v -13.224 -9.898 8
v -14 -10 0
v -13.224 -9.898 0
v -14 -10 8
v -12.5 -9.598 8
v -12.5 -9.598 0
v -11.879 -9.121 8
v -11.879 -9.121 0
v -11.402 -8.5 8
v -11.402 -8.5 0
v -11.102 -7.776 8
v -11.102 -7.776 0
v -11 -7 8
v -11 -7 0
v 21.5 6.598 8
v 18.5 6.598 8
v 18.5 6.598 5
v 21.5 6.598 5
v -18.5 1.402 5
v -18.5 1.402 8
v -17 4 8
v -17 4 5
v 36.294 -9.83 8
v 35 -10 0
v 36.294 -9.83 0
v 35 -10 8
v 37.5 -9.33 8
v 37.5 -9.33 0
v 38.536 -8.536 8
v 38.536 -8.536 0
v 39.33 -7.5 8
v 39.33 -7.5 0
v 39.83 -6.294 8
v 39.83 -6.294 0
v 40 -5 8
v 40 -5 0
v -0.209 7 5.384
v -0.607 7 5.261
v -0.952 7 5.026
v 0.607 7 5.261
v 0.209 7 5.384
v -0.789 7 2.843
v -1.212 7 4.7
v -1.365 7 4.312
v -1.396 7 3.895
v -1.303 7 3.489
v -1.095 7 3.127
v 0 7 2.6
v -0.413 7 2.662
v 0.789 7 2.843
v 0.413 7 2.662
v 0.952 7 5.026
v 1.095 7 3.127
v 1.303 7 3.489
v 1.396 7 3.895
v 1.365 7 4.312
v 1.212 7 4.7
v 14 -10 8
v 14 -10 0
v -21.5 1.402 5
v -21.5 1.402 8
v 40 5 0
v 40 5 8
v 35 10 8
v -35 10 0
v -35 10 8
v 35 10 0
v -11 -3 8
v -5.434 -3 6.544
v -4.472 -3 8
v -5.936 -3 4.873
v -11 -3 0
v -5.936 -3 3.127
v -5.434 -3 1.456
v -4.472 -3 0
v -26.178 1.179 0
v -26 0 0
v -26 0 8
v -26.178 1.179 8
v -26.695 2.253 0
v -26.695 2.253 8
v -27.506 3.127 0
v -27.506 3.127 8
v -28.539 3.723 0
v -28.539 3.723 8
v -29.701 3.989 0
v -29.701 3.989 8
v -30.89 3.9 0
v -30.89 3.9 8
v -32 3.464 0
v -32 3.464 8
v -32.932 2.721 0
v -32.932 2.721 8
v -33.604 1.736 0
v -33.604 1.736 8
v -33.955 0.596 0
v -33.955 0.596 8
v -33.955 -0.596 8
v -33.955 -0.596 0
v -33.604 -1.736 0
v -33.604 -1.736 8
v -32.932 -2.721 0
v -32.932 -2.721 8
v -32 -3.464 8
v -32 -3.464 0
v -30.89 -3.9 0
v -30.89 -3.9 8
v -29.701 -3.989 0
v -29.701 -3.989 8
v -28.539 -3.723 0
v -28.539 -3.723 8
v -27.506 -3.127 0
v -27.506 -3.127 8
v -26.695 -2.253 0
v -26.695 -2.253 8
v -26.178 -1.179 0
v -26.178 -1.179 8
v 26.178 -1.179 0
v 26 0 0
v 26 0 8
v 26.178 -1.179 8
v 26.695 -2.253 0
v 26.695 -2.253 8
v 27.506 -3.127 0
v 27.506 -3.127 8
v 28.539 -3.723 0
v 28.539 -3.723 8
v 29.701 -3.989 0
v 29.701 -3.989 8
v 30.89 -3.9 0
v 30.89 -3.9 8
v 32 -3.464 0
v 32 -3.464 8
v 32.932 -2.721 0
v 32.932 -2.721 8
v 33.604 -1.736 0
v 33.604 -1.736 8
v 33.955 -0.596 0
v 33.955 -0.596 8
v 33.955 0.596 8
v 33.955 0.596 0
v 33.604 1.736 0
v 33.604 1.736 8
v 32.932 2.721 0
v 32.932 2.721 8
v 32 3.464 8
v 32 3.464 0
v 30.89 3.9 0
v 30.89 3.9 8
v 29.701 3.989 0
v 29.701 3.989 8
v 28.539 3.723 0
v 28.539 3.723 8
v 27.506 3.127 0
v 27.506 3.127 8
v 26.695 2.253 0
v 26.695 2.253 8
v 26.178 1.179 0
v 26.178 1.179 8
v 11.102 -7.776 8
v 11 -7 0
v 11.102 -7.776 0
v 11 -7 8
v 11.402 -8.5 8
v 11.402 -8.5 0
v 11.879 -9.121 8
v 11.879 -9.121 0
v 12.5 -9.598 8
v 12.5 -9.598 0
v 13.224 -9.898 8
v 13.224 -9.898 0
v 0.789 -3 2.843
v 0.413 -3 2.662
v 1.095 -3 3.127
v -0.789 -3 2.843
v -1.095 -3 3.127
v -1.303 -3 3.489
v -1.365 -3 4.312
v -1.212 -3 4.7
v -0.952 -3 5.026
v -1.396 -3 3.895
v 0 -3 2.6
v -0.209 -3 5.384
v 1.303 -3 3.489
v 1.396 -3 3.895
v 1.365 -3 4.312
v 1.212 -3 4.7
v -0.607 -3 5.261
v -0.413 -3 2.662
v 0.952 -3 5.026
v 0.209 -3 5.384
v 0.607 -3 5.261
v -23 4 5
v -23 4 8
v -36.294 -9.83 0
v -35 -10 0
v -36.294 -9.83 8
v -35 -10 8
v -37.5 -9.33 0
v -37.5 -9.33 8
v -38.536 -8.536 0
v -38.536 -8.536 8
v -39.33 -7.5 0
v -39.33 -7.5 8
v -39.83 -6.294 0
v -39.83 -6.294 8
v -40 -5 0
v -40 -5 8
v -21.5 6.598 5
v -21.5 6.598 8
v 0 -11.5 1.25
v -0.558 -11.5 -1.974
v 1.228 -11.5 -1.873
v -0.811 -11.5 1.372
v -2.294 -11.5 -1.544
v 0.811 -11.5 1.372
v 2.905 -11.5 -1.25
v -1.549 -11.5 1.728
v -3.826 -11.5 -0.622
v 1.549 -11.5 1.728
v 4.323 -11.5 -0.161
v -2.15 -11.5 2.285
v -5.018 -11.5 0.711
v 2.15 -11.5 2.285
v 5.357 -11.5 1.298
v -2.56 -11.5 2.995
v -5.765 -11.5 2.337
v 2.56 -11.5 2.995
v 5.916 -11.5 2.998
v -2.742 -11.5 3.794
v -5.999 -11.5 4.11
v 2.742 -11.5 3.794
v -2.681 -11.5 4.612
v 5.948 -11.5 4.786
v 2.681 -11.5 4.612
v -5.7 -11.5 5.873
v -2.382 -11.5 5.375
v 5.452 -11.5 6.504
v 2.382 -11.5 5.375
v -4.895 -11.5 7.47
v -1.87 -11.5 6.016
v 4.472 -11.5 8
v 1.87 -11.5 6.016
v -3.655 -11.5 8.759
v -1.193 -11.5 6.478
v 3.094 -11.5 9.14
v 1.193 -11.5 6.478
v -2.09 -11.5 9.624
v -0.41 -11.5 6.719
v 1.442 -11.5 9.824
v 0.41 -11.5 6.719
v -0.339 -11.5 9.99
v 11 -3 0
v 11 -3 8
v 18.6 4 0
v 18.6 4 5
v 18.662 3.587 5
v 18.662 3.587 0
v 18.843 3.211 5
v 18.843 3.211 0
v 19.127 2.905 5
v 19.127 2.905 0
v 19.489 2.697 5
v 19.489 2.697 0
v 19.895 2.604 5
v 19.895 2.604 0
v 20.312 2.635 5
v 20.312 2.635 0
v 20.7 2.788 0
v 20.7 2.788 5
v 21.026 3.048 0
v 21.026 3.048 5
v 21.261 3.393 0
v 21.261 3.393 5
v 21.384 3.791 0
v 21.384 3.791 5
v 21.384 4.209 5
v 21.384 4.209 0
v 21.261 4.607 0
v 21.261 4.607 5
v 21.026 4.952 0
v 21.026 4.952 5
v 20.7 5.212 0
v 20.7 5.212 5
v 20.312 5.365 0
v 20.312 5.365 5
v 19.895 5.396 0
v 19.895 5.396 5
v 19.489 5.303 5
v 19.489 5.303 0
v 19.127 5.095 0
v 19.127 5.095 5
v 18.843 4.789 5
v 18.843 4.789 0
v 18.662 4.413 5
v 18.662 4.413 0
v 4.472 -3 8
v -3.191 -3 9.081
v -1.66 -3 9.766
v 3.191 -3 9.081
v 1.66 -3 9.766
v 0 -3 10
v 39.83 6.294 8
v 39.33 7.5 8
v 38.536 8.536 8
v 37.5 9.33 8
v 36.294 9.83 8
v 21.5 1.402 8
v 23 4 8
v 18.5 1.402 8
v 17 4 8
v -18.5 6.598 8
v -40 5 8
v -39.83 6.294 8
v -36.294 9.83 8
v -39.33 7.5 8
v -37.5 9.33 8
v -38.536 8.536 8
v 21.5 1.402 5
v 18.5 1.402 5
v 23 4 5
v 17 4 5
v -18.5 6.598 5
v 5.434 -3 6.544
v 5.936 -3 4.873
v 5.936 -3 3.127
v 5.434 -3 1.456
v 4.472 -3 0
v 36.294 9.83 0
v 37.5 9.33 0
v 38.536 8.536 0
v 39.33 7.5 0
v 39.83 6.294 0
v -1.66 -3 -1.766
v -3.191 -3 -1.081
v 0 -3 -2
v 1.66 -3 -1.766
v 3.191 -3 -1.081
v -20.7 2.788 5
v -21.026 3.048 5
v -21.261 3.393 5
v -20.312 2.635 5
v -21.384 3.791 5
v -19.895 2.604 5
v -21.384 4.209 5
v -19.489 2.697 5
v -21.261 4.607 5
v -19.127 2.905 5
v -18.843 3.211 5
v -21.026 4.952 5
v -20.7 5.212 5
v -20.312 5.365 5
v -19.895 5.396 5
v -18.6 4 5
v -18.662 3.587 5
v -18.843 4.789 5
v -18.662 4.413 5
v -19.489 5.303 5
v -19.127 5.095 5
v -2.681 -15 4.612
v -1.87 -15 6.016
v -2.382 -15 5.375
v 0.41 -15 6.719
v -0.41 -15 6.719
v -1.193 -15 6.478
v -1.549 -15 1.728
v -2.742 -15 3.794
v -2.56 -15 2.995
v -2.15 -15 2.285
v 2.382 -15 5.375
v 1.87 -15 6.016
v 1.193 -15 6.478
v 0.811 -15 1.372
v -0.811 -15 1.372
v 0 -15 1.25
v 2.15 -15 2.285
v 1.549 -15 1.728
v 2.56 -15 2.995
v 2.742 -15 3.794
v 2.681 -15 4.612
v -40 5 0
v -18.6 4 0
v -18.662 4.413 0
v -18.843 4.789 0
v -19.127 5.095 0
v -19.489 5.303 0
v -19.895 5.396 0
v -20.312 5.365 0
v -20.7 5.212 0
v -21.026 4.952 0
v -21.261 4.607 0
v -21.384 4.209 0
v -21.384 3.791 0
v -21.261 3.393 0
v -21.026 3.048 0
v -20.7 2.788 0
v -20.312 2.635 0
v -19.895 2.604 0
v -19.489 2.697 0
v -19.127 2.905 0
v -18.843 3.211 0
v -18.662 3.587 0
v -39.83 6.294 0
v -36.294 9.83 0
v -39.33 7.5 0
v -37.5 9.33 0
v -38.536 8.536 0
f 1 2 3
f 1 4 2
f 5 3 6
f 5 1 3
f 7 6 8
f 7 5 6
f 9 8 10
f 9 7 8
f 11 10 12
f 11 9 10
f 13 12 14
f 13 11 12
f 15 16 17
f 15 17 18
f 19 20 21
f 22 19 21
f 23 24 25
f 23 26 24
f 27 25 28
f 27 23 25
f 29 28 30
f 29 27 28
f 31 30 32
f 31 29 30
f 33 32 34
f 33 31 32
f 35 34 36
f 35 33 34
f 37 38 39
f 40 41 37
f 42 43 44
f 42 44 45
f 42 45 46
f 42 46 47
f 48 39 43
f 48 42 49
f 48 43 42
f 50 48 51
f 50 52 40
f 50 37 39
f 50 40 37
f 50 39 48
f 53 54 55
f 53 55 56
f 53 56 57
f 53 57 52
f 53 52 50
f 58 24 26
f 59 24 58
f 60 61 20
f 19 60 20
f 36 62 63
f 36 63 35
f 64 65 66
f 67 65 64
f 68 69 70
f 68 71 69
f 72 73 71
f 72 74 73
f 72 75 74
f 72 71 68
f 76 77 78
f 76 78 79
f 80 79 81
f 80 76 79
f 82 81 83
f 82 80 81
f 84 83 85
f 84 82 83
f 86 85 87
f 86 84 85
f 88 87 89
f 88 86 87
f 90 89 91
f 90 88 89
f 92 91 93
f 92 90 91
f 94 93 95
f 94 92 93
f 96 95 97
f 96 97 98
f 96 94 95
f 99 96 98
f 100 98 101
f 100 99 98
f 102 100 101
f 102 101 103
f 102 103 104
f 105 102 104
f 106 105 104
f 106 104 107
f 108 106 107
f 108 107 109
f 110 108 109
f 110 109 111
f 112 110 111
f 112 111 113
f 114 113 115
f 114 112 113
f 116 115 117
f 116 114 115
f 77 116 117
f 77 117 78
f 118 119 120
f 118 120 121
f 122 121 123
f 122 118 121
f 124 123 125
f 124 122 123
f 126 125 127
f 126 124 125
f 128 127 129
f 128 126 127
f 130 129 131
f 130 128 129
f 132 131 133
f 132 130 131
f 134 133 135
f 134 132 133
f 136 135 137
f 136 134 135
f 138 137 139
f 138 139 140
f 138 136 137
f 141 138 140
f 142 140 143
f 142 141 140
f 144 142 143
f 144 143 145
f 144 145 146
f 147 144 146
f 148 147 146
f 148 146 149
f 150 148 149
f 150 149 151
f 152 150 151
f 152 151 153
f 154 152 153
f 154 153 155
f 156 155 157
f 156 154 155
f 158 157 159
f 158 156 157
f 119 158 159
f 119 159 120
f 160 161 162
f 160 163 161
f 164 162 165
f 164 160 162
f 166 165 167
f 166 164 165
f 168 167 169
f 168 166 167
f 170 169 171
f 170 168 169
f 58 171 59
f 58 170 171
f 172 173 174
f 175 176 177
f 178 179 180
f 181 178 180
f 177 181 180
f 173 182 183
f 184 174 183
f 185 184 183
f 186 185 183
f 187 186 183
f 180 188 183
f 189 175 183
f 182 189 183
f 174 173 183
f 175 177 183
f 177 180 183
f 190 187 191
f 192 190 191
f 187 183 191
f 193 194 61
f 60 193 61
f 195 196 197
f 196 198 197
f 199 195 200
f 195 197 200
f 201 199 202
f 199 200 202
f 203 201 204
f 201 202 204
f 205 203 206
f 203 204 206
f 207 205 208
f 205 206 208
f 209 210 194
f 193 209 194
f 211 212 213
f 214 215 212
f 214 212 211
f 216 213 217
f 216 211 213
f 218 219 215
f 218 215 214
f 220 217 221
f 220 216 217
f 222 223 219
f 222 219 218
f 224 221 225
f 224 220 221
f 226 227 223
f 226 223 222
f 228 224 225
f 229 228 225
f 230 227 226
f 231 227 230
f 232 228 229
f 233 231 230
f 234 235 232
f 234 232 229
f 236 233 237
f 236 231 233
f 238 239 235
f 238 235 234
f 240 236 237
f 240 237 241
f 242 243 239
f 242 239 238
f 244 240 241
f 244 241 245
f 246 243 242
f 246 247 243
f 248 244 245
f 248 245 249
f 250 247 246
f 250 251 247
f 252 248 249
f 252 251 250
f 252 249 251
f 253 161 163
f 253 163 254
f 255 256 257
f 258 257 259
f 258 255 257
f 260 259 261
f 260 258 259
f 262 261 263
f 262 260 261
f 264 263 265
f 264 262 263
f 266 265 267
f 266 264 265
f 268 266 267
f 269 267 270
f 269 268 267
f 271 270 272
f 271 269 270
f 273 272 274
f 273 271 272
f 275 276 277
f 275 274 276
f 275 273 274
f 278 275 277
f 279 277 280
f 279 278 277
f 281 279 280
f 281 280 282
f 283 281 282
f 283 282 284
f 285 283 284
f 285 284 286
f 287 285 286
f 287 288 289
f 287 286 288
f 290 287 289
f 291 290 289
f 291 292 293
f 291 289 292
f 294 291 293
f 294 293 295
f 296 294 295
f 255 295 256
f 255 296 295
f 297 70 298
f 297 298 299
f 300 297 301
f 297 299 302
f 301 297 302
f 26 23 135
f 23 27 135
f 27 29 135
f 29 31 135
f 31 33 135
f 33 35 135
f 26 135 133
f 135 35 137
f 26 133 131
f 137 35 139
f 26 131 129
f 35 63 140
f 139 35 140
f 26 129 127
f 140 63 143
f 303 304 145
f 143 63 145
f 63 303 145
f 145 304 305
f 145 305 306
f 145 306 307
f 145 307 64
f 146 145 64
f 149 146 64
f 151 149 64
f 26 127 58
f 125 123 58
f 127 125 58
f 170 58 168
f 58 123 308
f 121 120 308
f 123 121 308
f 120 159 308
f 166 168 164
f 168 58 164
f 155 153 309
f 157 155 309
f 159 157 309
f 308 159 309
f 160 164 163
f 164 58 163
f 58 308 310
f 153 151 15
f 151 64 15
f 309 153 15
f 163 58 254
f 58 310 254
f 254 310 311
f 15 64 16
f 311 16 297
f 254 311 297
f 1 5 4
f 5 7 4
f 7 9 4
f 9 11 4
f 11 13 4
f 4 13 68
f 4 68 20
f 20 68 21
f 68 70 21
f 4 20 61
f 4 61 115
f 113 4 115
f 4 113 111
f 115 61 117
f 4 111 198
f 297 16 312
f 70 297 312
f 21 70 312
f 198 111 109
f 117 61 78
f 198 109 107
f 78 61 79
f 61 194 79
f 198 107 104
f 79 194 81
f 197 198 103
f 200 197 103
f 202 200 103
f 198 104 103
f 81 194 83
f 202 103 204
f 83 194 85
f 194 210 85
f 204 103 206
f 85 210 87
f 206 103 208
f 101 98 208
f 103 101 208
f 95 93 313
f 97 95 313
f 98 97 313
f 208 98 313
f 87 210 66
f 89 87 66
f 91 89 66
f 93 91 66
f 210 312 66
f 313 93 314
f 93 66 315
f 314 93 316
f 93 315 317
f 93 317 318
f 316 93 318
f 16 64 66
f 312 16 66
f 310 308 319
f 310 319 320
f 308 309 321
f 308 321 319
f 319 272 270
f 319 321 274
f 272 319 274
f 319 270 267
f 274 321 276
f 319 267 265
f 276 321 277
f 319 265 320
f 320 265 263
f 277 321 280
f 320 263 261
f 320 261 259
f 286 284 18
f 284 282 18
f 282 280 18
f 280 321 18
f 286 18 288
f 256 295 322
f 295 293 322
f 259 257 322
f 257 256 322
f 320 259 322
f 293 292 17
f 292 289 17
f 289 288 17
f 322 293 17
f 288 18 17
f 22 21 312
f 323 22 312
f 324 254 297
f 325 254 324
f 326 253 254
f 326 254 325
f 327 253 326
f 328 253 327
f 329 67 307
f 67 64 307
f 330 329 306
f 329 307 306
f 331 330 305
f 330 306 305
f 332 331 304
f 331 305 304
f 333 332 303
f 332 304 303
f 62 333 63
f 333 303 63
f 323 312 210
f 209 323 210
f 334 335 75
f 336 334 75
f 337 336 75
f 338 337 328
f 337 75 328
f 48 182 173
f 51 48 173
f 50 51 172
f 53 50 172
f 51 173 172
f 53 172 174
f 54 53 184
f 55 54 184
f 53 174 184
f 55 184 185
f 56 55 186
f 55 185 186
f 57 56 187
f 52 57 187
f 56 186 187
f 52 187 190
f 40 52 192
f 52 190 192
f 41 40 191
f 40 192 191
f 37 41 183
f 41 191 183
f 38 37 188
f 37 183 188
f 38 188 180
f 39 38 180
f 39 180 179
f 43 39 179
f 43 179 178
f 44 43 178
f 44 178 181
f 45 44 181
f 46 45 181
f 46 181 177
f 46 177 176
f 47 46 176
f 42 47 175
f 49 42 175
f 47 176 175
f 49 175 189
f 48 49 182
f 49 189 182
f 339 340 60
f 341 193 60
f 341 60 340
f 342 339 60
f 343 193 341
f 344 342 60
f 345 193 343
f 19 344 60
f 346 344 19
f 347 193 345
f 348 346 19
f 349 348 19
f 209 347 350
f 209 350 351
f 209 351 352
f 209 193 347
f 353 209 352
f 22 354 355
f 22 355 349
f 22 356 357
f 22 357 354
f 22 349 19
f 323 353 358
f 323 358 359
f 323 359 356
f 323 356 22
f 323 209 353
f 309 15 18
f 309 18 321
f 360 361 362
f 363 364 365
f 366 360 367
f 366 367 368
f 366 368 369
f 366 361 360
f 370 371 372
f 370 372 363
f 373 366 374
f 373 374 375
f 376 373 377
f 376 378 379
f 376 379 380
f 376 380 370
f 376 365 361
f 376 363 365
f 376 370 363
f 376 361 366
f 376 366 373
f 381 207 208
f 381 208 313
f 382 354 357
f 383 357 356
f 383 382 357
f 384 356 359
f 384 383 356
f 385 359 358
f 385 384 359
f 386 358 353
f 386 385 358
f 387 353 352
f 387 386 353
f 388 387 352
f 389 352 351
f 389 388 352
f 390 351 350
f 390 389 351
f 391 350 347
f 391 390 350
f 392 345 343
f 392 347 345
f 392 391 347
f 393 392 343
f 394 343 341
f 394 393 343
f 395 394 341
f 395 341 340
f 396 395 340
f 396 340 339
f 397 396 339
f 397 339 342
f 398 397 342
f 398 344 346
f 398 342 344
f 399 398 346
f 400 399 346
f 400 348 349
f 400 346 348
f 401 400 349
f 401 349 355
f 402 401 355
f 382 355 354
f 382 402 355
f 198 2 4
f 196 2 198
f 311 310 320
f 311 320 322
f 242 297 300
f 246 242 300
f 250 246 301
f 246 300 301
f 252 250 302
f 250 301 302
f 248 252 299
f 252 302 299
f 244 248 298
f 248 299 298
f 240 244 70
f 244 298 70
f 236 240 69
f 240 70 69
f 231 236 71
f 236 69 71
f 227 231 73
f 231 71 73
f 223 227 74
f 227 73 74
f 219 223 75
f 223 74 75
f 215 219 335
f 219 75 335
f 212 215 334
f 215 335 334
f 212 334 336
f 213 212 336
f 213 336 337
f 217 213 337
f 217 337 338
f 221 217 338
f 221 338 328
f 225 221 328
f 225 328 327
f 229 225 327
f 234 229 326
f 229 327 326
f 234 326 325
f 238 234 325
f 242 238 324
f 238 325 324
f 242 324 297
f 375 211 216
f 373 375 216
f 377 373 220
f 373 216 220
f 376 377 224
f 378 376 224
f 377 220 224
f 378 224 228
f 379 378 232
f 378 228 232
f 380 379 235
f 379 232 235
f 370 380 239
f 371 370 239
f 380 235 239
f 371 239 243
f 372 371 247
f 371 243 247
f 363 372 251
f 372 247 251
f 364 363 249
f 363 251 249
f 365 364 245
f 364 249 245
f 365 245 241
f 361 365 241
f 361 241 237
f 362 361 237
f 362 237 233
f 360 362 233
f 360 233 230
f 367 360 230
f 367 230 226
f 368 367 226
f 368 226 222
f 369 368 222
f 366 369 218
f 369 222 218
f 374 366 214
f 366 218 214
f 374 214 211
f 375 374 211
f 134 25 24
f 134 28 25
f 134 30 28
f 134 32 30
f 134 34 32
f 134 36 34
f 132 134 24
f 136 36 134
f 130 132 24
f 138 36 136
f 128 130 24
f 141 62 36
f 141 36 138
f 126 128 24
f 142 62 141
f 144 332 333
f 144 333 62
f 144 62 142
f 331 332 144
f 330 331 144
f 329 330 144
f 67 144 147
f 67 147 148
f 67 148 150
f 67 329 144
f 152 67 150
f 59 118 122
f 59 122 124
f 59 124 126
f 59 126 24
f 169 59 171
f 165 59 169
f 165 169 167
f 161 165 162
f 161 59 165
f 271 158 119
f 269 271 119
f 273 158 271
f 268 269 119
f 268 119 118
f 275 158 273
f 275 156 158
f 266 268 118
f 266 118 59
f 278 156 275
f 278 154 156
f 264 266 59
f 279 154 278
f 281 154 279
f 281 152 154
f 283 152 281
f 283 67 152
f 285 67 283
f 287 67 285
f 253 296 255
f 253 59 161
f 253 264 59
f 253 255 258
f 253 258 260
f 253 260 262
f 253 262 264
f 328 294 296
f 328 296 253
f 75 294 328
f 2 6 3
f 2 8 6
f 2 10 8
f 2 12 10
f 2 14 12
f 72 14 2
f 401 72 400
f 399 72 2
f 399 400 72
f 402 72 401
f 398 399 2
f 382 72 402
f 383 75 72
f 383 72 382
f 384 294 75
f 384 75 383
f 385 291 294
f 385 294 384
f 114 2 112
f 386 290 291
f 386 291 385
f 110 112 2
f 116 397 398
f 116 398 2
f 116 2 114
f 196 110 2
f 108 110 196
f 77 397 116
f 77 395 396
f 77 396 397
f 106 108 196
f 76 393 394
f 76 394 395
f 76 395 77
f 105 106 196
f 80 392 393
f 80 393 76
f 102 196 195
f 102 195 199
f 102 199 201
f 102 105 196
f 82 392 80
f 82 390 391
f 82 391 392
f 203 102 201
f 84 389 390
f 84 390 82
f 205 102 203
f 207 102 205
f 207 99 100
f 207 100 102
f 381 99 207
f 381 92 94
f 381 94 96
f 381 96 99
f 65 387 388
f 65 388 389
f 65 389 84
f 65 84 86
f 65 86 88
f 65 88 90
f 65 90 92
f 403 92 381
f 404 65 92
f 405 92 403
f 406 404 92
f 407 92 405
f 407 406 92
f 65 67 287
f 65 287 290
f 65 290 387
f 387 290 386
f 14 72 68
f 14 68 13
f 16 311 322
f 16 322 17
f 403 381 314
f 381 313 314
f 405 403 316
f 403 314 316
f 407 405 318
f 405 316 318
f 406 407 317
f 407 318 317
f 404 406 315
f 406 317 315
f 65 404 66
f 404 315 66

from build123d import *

# Parameters (mm, degrees)
SKETCH1_R                = 4
SKETCH1_R_2              = 1.4
BOSS_EXTRUDE1_DEPTH      = 8
OUTSIDE_CURVES_R         = 5
INSIDE_CURVES_R          = 3
BOLT_HOLES_DEPTH         = 3
SKETCH3_R                = 1.4
BEARING_SCREW_HOLE_DEPTH = 10
SKETCH5_R                = 6
BEARINGS_DEPTH           = 8.5
SKETCH6_R                = 2.75
SCREW_DEPTH              = 3.5


with BuildPart() as part:
    # Sketch1 → Boss-Extrude1 (new body)
    with BuildSketch(Plane.XY):
        Polygon((-11, -3), (-11, -10), (-40, -10), (-40, 10), (40, 10), (40, -10), (11, -10), (11, -3), align=None)
        with Locations((-30, 0)):
            Circle(SKETCH1_R, mode=Mode.SUBTRACT)
        with Locations((-20, 4)):
            Circle(SKETCH1_R_2, mode=Mode.SUBTRACT)
        with Locations(Location((20, 4, 0), (0, 0, 180))):
            Circle(SKETCH1_R_2, mode=Mode.SUBTRACT)
        with Locations(Location((30, 0, 0), (0, 0, 180))):
            Circle(SKETCH1_R, mode=Mode.SUBTRACT)
    extrude(amount=BOSS_EXTRUDE1_DEPTH)

    # outside curves
    outside_curves_edges = [part.edges().sort_by_distance(p)[0] for p in [
        (-40, -10, 4),
        (-40, 10, 4),
        (40, 10, 4),
        (40, -10, 4),
    ]]
    fillet(outside_curves_edges, radius=OUTSIDE_CURVES_R)

    # inside curves
    inside_curves_edges = [part.edges().sort_by_distance(p)[0] for p in [
        (-11, -10, 4),
        (11, -10, 4),
    ]]
    fillet(inside_curves_edges, radius=INSIDE_CURVES_R)

    # Sketch2 → bolt holes (cut)
    with BuildSketch(Plane.XY.offset(8)):
        Polygon((-17, 4), (-18.5, 6.598076211), (-21.5, 6.598076211), (-23, 4), (-21.5, 1.401923789), (-18.5, 1.401923789), align=None)
        Polygon((18.5, 1.401923789), (17, 4), (18.5, 6.598076211), (21.5, 6.598076211), (23, 4), (21.5, 1.401923789), align=None)
    extrude(amount=-BOLT_HOLES_DEPTH, mode=Mode.SUBTRACT)

    # Sketch3 → bearing screw hole (cut)
    with BuildSketch(Plane.XZ.offset(3)):
        with Locations(Location((0, 4, 0), (0, 0, 270))):
            Circle(SKETCH3_R)
    extrude(amount=-BEARING_SCREW_HOLE_DEPTH, mode=Mode.SUBTRACT)

    # Sketch5 → bearings (add)
    with BuildSketch(Plane.XZ.offset(3)):
        with Locations(Location((0, 4, 0), (0, 0, 41.810314896))):
            Circle(SKETCH5_R)
    extrude(amount=BEARINGS_DEPTH)

    # Sketch6 → screw (add)
    with BuildSketch(Plane.XZ.offset(11.5)):
        with Locations(Location((0, 4, 0), (0, 0, 270))):
            Circle(SKETCH6_R)
    extrude(amount=SCREW_DEPTH)


solid = part.part
